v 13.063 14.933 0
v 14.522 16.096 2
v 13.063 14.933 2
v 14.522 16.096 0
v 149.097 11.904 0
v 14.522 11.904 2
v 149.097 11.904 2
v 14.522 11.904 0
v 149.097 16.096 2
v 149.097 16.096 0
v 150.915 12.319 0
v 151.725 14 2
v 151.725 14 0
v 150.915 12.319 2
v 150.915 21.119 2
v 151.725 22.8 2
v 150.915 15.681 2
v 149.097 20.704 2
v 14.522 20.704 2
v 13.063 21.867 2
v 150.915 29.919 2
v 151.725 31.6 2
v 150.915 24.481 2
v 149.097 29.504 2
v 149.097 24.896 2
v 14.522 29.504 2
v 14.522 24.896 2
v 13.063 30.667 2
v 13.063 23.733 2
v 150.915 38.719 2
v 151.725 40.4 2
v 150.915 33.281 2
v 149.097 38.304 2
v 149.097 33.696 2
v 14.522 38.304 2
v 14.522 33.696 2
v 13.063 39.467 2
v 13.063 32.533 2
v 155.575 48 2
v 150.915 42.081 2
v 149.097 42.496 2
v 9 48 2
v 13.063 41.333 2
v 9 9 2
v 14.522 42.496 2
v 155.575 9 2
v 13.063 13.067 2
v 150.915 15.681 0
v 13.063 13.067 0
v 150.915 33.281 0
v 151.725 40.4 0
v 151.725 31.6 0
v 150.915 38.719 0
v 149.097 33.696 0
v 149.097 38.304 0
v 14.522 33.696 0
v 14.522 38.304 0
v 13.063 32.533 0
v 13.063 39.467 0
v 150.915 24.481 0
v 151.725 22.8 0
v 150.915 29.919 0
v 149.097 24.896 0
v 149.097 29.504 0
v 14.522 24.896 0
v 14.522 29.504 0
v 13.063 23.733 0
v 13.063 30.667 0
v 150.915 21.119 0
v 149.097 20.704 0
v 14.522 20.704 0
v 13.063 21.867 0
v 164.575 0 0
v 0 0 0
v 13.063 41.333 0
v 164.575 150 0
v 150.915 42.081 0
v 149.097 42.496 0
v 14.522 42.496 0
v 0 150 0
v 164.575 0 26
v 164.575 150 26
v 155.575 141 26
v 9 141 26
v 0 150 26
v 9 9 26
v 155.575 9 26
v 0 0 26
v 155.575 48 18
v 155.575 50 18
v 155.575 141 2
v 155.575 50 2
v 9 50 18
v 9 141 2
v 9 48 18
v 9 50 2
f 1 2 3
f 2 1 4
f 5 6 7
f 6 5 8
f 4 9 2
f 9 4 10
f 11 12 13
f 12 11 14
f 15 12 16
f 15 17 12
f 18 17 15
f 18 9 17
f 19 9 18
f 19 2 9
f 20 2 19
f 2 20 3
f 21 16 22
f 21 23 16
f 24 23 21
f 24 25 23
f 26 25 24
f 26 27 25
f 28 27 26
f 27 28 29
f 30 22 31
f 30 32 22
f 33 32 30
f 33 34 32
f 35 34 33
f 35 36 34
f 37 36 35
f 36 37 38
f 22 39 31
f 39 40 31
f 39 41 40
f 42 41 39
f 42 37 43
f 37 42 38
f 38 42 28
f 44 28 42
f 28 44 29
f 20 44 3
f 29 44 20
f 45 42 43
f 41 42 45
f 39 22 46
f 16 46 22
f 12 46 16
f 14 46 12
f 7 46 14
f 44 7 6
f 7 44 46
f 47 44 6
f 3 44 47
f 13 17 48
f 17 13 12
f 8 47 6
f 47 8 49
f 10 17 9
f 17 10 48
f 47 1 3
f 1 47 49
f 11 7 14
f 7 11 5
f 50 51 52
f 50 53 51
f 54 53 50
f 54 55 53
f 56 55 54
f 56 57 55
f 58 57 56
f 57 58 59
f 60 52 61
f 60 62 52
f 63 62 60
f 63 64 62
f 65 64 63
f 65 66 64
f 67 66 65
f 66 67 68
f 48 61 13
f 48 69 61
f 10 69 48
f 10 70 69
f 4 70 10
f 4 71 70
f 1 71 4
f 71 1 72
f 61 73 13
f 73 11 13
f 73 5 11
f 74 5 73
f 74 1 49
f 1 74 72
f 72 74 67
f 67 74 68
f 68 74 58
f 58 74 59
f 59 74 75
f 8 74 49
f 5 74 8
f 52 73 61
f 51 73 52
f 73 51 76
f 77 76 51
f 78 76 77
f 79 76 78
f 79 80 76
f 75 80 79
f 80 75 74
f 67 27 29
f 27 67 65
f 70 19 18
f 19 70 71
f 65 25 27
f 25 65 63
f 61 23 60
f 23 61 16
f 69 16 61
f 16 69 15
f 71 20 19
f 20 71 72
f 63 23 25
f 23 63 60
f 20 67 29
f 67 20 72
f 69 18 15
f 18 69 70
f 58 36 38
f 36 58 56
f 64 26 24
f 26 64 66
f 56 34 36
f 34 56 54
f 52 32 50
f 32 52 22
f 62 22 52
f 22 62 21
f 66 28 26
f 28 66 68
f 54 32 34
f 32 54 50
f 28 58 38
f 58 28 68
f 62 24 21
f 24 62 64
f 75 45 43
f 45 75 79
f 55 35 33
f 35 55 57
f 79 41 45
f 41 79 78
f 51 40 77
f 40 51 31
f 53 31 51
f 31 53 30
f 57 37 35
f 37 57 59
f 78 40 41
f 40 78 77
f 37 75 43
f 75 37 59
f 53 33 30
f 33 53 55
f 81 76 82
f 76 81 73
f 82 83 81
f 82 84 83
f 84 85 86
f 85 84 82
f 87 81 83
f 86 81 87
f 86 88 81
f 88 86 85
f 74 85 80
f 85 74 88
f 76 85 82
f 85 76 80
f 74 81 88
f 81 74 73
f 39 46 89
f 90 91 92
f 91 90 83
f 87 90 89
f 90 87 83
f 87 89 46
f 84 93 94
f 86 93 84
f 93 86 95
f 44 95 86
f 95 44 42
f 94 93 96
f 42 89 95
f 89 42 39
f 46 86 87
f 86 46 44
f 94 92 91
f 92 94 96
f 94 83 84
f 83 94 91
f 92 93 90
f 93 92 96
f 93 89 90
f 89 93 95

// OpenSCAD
// use the same width and depth as with the bee box
// this feed tray is better suited for solid foods due to
// the nature of 3D printing

width = 146.575; 
depth = 150;
height = 26;

difference() {
cube([width+18,depth,height]);
        color("blue") translate([9,9,2]) cube([width,39,height]);
        translate([0,4,0]) queen_excluder(width);
translate([9,50,2]) cube([width,(depth-18-39-2),height]);
translate([9,48,18]) cube([width,2,16]); 
}



module queen_excluder(length=146.575) { // using diameter of 4.3mm
    for(i = [10 : 8.8 : 44]) {
        translate([(length-(length-30))/2,i,0])
        hull() {
            cylinder(d=4.3,h=2);
            translate([length-12,0,0]) cylinder(d=4.3,h=2);
        }
    }
}
